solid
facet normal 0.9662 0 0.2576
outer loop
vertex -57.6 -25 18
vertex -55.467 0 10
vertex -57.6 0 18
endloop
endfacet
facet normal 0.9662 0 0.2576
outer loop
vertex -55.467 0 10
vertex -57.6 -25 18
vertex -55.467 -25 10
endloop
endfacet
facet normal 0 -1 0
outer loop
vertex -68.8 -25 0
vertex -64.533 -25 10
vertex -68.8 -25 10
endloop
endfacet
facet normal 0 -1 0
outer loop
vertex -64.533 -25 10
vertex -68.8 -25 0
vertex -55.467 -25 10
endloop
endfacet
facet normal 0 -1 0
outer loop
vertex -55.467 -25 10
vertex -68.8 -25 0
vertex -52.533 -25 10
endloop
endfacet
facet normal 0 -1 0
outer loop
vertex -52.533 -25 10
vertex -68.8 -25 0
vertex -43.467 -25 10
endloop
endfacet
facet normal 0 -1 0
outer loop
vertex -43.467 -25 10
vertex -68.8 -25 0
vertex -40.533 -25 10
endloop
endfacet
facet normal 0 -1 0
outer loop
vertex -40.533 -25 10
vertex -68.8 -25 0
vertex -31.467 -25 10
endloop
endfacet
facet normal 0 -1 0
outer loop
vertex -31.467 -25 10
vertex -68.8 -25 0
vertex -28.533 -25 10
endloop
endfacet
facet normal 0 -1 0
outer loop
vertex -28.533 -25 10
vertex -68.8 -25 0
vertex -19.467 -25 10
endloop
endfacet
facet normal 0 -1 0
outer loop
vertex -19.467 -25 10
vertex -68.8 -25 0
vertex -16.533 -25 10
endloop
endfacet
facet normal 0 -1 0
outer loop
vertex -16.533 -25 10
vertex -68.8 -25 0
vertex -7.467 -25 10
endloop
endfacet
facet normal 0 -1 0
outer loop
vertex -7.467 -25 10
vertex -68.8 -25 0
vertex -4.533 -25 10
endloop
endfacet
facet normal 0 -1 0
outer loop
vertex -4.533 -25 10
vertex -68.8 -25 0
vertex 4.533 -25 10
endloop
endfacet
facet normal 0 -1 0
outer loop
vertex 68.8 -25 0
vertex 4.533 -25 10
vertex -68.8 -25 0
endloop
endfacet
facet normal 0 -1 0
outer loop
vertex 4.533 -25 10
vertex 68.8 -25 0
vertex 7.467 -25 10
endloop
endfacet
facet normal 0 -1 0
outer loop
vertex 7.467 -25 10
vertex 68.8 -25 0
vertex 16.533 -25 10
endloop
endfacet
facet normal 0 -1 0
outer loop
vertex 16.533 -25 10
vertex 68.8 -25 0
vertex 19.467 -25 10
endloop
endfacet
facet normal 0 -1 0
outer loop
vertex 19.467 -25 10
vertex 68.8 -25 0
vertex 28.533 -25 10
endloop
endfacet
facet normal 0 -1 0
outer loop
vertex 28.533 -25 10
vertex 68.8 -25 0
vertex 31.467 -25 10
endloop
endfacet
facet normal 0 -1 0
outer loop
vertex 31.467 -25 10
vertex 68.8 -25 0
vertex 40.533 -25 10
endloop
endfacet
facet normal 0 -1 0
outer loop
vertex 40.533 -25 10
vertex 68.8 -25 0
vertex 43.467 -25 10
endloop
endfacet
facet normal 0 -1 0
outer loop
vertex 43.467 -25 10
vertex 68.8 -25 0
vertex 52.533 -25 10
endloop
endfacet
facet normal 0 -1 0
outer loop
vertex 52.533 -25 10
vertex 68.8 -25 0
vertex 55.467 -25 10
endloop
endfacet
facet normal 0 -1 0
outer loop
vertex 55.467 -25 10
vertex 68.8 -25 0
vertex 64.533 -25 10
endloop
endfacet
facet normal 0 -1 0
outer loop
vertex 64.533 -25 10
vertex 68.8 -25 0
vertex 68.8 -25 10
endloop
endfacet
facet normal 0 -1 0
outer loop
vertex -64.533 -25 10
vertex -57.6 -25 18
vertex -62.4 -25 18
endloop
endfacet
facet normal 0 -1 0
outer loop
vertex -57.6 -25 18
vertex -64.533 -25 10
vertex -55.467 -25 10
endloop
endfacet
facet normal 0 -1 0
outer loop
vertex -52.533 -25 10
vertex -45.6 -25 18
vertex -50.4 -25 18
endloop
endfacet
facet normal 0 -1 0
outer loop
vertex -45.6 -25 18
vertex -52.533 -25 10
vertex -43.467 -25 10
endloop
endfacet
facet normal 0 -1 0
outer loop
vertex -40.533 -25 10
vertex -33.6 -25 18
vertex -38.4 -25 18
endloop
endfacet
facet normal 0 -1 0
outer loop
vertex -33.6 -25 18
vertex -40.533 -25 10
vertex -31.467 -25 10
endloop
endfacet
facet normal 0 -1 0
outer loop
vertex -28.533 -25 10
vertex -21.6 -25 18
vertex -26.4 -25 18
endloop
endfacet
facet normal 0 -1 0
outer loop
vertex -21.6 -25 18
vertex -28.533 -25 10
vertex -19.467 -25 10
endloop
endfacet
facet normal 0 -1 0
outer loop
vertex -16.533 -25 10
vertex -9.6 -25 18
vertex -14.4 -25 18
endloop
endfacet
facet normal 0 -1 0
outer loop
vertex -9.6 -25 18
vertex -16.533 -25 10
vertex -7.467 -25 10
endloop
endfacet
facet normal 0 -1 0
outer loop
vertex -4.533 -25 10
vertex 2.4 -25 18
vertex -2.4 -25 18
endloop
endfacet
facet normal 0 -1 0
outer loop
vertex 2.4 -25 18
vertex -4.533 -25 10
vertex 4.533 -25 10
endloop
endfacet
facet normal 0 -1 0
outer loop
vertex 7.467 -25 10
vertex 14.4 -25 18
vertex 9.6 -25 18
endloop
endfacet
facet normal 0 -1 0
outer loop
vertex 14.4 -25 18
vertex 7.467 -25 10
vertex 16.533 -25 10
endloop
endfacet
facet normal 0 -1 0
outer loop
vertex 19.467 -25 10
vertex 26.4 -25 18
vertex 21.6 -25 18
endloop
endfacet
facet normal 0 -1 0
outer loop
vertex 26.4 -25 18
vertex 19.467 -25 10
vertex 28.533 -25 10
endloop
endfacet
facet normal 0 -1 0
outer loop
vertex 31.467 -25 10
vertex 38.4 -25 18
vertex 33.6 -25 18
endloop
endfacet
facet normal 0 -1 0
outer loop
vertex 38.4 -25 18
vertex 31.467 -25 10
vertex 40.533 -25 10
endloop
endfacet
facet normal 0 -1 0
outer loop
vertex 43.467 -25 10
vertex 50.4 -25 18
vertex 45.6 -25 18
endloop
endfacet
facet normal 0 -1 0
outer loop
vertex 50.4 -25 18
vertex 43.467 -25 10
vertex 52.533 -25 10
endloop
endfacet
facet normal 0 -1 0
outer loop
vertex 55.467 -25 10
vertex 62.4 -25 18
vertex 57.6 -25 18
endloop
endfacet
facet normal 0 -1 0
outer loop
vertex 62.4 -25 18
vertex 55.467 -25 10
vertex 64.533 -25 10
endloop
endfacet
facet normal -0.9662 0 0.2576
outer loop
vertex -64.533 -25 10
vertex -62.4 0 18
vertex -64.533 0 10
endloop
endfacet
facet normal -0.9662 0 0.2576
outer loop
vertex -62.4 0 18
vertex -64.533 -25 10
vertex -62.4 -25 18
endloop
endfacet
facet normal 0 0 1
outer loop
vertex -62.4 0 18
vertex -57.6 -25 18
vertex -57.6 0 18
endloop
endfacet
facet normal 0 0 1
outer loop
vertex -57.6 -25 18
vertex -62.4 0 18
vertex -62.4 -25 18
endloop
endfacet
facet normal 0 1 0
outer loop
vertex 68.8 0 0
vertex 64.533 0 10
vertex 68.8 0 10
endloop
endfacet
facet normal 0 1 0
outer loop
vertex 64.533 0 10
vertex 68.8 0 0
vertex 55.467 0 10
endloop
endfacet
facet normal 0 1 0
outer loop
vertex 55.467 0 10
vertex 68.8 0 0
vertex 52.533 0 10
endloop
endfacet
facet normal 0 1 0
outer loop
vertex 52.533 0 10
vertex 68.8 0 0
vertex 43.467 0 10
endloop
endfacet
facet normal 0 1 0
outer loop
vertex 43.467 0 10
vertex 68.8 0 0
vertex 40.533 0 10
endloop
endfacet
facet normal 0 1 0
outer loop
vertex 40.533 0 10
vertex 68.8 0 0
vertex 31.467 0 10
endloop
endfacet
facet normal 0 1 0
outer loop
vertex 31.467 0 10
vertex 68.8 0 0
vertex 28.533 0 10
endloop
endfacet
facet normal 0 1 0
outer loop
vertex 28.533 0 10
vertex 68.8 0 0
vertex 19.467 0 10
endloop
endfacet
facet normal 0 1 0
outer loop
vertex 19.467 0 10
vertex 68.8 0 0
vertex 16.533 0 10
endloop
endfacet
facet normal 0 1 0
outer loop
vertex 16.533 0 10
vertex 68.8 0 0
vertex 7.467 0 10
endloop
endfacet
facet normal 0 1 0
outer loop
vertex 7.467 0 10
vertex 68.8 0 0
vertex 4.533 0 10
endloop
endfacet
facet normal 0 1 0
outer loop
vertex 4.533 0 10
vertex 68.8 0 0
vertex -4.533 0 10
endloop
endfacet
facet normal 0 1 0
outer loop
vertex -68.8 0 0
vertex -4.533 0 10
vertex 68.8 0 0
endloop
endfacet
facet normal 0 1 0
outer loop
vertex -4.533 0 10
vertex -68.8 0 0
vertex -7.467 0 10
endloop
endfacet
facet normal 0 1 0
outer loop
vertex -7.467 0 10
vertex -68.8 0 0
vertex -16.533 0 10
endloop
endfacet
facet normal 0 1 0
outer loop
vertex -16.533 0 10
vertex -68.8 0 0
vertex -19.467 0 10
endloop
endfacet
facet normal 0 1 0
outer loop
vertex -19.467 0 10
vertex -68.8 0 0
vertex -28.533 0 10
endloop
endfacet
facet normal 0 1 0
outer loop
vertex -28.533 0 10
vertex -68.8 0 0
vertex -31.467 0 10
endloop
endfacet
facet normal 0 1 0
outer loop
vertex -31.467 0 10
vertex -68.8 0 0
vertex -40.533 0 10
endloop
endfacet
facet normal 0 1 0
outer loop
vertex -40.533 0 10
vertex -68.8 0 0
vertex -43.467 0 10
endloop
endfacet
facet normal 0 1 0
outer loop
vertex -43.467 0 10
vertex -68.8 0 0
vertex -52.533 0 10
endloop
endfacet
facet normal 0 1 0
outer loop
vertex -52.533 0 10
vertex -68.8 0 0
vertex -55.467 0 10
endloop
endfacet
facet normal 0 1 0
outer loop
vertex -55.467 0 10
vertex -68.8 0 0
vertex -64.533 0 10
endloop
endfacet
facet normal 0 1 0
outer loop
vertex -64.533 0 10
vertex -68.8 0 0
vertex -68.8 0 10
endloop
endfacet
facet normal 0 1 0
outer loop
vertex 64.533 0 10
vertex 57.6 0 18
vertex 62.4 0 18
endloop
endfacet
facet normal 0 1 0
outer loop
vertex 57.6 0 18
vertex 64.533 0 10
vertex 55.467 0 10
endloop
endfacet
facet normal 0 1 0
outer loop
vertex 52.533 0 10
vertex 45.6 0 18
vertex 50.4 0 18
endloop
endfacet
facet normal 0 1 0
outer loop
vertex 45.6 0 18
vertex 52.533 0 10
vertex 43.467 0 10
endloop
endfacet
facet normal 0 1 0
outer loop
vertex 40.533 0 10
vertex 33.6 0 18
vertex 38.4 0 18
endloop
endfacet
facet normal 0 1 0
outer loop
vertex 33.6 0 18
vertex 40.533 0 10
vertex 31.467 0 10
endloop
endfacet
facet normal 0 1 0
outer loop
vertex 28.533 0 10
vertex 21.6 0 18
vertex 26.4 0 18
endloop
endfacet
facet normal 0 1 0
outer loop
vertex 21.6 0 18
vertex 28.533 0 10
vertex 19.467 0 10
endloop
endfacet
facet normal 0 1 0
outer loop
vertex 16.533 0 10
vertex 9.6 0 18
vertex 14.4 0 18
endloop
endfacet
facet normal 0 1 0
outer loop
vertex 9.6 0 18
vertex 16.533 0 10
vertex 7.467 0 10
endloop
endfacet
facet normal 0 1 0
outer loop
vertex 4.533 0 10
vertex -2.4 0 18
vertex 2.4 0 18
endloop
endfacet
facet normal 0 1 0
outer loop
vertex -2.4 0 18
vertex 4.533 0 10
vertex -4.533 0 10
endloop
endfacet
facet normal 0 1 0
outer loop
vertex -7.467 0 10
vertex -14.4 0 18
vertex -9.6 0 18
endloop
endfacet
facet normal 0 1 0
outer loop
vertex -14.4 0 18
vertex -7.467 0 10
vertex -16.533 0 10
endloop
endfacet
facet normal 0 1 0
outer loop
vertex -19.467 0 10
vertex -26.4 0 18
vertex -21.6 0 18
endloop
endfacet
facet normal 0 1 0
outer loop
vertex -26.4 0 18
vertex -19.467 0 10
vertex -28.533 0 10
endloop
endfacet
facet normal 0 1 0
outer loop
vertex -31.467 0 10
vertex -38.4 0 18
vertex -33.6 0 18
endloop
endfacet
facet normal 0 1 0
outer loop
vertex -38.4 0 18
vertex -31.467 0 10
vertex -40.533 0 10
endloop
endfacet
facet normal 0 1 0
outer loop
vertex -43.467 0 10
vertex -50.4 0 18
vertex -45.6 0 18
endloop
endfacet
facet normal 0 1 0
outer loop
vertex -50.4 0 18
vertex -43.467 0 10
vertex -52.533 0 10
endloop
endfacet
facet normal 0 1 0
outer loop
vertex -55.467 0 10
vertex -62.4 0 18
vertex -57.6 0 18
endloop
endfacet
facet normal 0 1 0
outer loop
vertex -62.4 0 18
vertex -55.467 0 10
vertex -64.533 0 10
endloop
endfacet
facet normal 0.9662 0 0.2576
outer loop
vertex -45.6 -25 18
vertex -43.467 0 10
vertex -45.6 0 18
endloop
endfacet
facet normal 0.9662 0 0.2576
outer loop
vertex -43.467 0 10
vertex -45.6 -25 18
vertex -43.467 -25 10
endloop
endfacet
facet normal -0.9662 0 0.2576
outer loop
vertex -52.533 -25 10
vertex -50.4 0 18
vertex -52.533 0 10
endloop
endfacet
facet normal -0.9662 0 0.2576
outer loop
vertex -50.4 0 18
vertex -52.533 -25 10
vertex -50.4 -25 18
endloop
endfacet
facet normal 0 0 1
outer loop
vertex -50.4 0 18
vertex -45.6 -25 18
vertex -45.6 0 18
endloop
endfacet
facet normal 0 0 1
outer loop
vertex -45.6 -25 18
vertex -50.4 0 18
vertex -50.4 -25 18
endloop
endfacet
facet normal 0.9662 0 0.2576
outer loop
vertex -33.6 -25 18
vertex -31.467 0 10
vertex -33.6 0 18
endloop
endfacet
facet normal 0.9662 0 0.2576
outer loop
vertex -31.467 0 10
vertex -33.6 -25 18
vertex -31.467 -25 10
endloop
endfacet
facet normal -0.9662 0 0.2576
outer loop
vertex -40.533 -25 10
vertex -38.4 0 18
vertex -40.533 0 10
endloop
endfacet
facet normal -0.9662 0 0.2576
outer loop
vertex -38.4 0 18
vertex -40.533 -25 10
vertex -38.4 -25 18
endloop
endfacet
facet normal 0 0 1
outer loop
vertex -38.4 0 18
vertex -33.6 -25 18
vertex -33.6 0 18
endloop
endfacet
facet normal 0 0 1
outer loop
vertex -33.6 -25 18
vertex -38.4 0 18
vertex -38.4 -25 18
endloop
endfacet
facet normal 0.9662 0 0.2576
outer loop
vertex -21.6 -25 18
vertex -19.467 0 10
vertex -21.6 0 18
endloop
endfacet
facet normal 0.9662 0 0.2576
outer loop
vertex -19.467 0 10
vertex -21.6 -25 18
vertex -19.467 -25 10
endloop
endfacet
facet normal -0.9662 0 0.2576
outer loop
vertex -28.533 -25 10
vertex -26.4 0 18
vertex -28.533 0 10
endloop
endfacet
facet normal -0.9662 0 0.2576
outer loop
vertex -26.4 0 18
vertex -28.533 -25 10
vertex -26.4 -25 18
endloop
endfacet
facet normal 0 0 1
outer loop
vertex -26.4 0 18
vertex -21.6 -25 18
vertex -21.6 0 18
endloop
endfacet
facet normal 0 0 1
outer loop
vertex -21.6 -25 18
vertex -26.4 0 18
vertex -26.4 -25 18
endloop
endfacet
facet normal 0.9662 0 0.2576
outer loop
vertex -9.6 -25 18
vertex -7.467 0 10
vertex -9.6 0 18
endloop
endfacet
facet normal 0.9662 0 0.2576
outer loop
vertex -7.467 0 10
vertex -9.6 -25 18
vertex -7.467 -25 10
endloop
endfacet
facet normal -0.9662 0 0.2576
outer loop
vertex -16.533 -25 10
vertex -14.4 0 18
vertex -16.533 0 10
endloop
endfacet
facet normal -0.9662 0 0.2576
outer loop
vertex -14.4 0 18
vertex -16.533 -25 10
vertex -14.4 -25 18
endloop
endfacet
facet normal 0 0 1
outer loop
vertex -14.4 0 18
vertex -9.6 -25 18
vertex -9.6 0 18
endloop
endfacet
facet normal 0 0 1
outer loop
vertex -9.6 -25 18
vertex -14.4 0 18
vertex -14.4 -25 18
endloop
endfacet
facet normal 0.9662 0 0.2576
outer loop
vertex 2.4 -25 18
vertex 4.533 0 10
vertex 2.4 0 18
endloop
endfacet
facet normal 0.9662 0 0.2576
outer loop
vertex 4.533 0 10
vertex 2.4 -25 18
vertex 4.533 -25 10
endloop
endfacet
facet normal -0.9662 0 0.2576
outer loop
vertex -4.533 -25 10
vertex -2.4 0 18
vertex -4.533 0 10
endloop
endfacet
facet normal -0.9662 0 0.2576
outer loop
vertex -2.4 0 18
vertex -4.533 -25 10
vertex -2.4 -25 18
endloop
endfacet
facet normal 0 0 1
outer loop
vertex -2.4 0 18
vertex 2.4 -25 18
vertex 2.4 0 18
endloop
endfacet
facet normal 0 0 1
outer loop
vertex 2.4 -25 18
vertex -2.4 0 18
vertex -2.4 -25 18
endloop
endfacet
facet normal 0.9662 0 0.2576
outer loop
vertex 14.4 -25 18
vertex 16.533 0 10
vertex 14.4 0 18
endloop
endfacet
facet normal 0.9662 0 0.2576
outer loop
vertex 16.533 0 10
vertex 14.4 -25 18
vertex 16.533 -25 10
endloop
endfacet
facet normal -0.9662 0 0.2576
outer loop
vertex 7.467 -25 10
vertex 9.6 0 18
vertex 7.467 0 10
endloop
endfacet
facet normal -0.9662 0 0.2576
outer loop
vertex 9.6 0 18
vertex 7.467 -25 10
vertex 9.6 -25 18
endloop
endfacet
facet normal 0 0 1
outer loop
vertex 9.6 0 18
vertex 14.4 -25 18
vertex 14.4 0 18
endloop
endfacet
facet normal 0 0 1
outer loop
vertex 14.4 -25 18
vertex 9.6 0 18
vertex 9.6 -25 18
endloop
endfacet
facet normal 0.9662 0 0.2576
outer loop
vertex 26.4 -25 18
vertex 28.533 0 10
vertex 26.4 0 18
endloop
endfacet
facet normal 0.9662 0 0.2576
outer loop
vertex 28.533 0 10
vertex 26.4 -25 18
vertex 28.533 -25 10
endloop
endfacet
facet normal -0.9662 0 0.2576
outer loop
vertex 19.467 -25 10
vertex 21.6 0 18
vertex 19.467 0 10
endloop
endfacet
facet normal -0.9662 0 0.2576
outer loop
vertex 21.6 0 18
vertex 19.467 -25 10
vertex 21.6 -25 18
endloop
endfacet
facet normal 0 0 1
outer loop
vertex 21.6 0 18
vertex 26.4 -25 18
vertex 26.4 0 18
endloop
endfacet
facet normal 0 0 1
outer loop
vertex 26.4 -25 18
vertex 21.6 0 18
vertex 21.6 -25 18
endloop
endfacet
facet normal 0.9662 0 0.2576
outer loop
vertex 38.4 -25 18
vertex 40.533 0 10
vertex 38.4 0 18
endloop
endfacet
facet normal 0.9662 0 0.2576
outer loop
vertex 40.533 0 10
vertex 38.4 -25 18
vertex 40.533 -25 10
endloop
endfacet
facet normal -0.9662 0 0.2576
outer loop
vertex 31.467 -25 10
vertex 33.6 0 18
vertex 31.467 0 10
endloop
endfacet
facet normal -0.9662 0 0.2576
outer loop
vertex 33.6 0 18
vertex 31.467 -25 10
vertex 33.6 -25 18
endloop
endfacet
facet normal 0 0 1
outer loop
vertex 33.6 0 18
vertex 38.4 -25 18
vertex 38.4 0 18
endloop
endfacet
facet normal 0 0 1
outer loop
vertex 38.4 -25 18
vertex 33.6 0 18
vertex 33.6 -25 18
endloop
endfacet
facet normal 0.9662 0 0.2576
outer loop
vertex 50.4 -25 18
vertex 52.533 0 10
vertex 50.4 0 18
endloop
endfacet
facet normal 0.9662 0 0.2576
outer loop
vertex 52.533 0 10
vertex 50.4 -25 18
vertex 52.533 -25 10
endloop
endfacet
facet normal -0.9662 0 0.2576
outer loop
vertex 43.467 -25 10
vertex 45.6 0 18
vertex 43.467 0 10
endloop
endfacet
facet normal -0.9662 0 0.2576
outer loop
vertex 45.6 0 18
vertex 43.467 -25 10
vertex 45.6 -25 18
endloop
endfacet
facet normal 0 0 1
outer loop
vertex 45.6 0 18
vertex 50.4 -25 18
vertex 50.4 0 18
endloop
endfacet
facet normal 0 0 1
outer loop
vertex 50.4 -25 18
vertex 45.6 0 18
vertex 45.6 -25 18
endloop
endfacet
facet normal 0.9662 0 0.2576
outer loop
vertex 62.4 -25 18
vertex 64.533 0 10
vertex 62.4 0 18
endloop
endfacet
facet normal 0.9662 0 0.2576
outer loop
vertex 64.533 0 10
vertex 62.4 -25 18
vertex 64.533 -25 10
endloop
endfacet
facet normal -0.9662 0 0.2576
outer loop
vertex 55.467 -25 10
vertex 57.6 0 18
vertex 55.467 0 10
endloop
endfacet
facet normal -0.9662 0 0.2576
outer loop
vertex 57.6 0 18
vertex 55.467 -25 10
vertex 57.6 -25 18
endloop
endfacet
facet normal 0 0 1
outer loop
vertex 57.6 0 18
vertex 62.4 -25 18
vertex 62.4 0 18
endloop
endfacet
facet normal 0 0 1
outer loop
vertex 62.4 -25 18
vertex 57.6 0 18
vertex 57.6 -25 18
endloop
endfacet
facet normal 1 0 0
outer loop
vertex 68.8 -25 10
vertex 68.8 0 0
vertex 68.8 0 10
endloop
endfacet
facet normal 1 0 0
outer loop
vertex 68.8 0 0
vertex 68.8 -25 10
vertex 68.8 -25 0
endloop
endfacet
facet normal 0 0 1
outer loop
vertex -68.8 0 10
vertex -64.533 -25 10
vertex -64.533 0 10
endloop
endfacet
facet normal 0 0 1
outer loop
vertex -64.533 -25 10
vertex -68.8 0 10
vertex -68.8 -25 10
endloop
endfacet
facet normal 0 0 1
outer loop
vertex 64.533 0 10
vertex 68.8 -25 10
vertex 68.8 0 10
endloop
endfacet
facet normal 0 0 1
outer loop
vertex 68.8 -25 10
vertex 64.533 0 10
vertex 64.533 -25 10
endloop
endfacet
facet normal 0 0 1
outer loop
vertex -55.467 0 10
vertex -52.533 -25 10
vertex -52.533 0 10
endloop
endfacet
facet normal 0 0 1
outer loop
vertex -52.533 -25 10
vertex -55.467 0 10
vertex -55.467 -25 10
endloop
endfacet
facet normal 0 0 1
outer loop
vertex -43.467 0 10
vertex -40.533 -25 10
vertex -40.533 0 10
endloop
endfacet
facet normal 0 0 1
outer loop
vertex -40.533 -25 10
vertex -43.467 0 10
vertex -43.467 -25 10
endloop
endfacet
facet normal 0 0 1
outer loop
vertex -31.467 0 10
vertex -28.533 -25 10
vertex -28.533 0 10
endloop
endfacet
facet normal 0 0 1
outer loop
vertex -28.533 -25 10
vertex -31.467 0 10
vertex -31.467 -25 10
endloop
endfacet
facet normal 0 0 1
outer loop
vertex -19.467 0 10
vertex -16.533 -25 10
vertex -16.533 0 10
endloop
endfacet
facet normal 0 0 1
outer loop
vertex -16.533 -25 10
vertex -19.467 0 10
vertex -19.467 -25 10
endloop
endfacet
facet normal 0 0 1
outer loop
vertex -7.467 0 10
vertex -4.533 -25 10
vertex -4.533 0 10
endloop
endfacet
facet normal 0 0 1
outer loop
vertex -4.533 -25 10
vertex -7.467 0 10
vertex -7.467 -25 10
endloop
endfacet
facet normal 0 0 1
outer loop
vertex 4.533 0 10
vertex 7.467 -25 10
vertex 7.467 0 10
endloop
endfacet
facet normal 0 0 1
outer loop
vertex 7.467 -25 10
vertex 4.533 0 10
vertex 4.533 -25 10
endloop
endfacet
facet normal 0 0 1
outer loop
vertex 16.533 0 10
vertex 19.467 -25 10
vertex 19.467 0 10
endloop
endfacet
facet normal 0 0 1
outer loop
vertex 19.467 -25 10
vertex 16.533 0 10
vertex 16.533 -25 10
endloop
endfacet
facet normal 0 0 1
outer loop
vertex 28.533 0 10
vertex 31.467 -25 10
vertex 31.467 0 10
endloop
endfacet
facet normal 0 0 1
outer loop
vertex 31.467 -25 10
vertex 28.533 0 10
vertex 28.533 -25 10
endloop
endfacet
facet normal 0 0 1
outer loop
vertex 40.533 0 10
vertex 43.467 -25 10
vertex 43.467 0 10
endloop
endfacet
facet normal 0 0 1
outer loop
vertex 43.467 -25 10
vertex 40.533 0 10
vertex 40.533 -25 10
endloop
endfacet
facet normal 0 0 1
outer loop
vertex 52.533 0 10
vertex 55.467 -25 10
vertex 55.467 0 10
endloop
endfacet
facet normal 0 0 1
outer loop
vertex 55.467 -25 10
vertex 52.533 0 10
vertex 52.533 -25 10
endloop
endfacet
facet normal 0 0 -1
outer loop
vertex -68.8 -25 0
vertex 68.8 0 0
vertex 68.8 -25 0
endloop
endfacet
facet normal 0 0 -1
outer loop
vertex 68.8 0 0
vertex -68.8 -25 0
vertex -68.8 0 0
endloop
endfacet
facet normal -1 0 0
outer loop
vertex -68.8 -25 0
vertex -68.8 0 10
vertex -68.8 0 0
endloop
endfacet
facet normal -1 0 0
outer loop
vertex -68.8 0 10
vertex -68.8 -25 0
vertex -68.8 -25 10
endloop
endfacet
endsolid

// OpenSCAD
$fn = 32;

// ----------------------------------------------------------------------
// Toothed rack, 11 teeth
// 12 mm pitch, 8 mm teeth
// ----------------------------------------------------------------------

// --- parameters (mm) ---
bar_w = 25;     // bar width (Y)
bar_h = 10;     // bar height (Z)
teeth = 11;     // number of teeth
pitch = 12;     // tooth pitch
tooth_h = 8;    // tooth height above the bar
root_w = 9.6;   // tooth width at the root
crest_w = 4.8;  // tooth width at the crest

// --- derived feature positions (mm) ---
span = (teeth - 1) * pitch;  // = 120   distance between the outer teeth
bar_l = span + root_w + 8;   // = 137.6   bar length: teeth plus 4 mm at each end
tooth_x = -span / 2;         // = -60   X of the first tooth
height = bar_h + tooth_h;    // = 18   overall height
feature_centers = [
  [tooth_x + 0 * pitch, -bar_w / 2],
  [tooth_x + 1 * pitch, -bar_w / 2],
  [tooth_x + 2 * pitch, -bar_w / 2],
  [tooth_x + 3 * pitch, -bar_w / 2],
  [tooth_x + 4 * pitch, -bar_w / 2],
  [tooth_x + 5 * pitch, -bar_w / 2],
  [tooth_x + 6 * pitch, -bar_w / 2],
  [tooth_x + 7 * pitch, -bar_w / 2],
  [tooth_x + 8 * pitch, -bar_w / 2],
  [tooth_x + 9 * pitch, -bar_w / 2],
  [tooth_x + 10 * pitch, -bar_w / 2]
];   // tooth centre line, drives the tooth loop

// bar with a rack of teeth, one extruded trapezoium per centre
module rack_tooth() {
  linear_extrude(height = bar_w)
    polygon(points = [
      [0, 0],
      [root_w, 0],
      [root_w / 2 + crest_w / 2, tooth_h + 1],
      [root_w / 2 - crest_w / 2, tooth_h + 1]
    ]);
}

union() {
  translate([-bar_l / 2, -bar_w, 0]) cube([bar_l, bar_w, bar_h]);
  for (centre = feature_centers)
    translate([centre[0] - root_w / 2, 0, bar_h - 1]) rotate([90, 0, 0]) rack_tooth();
}
